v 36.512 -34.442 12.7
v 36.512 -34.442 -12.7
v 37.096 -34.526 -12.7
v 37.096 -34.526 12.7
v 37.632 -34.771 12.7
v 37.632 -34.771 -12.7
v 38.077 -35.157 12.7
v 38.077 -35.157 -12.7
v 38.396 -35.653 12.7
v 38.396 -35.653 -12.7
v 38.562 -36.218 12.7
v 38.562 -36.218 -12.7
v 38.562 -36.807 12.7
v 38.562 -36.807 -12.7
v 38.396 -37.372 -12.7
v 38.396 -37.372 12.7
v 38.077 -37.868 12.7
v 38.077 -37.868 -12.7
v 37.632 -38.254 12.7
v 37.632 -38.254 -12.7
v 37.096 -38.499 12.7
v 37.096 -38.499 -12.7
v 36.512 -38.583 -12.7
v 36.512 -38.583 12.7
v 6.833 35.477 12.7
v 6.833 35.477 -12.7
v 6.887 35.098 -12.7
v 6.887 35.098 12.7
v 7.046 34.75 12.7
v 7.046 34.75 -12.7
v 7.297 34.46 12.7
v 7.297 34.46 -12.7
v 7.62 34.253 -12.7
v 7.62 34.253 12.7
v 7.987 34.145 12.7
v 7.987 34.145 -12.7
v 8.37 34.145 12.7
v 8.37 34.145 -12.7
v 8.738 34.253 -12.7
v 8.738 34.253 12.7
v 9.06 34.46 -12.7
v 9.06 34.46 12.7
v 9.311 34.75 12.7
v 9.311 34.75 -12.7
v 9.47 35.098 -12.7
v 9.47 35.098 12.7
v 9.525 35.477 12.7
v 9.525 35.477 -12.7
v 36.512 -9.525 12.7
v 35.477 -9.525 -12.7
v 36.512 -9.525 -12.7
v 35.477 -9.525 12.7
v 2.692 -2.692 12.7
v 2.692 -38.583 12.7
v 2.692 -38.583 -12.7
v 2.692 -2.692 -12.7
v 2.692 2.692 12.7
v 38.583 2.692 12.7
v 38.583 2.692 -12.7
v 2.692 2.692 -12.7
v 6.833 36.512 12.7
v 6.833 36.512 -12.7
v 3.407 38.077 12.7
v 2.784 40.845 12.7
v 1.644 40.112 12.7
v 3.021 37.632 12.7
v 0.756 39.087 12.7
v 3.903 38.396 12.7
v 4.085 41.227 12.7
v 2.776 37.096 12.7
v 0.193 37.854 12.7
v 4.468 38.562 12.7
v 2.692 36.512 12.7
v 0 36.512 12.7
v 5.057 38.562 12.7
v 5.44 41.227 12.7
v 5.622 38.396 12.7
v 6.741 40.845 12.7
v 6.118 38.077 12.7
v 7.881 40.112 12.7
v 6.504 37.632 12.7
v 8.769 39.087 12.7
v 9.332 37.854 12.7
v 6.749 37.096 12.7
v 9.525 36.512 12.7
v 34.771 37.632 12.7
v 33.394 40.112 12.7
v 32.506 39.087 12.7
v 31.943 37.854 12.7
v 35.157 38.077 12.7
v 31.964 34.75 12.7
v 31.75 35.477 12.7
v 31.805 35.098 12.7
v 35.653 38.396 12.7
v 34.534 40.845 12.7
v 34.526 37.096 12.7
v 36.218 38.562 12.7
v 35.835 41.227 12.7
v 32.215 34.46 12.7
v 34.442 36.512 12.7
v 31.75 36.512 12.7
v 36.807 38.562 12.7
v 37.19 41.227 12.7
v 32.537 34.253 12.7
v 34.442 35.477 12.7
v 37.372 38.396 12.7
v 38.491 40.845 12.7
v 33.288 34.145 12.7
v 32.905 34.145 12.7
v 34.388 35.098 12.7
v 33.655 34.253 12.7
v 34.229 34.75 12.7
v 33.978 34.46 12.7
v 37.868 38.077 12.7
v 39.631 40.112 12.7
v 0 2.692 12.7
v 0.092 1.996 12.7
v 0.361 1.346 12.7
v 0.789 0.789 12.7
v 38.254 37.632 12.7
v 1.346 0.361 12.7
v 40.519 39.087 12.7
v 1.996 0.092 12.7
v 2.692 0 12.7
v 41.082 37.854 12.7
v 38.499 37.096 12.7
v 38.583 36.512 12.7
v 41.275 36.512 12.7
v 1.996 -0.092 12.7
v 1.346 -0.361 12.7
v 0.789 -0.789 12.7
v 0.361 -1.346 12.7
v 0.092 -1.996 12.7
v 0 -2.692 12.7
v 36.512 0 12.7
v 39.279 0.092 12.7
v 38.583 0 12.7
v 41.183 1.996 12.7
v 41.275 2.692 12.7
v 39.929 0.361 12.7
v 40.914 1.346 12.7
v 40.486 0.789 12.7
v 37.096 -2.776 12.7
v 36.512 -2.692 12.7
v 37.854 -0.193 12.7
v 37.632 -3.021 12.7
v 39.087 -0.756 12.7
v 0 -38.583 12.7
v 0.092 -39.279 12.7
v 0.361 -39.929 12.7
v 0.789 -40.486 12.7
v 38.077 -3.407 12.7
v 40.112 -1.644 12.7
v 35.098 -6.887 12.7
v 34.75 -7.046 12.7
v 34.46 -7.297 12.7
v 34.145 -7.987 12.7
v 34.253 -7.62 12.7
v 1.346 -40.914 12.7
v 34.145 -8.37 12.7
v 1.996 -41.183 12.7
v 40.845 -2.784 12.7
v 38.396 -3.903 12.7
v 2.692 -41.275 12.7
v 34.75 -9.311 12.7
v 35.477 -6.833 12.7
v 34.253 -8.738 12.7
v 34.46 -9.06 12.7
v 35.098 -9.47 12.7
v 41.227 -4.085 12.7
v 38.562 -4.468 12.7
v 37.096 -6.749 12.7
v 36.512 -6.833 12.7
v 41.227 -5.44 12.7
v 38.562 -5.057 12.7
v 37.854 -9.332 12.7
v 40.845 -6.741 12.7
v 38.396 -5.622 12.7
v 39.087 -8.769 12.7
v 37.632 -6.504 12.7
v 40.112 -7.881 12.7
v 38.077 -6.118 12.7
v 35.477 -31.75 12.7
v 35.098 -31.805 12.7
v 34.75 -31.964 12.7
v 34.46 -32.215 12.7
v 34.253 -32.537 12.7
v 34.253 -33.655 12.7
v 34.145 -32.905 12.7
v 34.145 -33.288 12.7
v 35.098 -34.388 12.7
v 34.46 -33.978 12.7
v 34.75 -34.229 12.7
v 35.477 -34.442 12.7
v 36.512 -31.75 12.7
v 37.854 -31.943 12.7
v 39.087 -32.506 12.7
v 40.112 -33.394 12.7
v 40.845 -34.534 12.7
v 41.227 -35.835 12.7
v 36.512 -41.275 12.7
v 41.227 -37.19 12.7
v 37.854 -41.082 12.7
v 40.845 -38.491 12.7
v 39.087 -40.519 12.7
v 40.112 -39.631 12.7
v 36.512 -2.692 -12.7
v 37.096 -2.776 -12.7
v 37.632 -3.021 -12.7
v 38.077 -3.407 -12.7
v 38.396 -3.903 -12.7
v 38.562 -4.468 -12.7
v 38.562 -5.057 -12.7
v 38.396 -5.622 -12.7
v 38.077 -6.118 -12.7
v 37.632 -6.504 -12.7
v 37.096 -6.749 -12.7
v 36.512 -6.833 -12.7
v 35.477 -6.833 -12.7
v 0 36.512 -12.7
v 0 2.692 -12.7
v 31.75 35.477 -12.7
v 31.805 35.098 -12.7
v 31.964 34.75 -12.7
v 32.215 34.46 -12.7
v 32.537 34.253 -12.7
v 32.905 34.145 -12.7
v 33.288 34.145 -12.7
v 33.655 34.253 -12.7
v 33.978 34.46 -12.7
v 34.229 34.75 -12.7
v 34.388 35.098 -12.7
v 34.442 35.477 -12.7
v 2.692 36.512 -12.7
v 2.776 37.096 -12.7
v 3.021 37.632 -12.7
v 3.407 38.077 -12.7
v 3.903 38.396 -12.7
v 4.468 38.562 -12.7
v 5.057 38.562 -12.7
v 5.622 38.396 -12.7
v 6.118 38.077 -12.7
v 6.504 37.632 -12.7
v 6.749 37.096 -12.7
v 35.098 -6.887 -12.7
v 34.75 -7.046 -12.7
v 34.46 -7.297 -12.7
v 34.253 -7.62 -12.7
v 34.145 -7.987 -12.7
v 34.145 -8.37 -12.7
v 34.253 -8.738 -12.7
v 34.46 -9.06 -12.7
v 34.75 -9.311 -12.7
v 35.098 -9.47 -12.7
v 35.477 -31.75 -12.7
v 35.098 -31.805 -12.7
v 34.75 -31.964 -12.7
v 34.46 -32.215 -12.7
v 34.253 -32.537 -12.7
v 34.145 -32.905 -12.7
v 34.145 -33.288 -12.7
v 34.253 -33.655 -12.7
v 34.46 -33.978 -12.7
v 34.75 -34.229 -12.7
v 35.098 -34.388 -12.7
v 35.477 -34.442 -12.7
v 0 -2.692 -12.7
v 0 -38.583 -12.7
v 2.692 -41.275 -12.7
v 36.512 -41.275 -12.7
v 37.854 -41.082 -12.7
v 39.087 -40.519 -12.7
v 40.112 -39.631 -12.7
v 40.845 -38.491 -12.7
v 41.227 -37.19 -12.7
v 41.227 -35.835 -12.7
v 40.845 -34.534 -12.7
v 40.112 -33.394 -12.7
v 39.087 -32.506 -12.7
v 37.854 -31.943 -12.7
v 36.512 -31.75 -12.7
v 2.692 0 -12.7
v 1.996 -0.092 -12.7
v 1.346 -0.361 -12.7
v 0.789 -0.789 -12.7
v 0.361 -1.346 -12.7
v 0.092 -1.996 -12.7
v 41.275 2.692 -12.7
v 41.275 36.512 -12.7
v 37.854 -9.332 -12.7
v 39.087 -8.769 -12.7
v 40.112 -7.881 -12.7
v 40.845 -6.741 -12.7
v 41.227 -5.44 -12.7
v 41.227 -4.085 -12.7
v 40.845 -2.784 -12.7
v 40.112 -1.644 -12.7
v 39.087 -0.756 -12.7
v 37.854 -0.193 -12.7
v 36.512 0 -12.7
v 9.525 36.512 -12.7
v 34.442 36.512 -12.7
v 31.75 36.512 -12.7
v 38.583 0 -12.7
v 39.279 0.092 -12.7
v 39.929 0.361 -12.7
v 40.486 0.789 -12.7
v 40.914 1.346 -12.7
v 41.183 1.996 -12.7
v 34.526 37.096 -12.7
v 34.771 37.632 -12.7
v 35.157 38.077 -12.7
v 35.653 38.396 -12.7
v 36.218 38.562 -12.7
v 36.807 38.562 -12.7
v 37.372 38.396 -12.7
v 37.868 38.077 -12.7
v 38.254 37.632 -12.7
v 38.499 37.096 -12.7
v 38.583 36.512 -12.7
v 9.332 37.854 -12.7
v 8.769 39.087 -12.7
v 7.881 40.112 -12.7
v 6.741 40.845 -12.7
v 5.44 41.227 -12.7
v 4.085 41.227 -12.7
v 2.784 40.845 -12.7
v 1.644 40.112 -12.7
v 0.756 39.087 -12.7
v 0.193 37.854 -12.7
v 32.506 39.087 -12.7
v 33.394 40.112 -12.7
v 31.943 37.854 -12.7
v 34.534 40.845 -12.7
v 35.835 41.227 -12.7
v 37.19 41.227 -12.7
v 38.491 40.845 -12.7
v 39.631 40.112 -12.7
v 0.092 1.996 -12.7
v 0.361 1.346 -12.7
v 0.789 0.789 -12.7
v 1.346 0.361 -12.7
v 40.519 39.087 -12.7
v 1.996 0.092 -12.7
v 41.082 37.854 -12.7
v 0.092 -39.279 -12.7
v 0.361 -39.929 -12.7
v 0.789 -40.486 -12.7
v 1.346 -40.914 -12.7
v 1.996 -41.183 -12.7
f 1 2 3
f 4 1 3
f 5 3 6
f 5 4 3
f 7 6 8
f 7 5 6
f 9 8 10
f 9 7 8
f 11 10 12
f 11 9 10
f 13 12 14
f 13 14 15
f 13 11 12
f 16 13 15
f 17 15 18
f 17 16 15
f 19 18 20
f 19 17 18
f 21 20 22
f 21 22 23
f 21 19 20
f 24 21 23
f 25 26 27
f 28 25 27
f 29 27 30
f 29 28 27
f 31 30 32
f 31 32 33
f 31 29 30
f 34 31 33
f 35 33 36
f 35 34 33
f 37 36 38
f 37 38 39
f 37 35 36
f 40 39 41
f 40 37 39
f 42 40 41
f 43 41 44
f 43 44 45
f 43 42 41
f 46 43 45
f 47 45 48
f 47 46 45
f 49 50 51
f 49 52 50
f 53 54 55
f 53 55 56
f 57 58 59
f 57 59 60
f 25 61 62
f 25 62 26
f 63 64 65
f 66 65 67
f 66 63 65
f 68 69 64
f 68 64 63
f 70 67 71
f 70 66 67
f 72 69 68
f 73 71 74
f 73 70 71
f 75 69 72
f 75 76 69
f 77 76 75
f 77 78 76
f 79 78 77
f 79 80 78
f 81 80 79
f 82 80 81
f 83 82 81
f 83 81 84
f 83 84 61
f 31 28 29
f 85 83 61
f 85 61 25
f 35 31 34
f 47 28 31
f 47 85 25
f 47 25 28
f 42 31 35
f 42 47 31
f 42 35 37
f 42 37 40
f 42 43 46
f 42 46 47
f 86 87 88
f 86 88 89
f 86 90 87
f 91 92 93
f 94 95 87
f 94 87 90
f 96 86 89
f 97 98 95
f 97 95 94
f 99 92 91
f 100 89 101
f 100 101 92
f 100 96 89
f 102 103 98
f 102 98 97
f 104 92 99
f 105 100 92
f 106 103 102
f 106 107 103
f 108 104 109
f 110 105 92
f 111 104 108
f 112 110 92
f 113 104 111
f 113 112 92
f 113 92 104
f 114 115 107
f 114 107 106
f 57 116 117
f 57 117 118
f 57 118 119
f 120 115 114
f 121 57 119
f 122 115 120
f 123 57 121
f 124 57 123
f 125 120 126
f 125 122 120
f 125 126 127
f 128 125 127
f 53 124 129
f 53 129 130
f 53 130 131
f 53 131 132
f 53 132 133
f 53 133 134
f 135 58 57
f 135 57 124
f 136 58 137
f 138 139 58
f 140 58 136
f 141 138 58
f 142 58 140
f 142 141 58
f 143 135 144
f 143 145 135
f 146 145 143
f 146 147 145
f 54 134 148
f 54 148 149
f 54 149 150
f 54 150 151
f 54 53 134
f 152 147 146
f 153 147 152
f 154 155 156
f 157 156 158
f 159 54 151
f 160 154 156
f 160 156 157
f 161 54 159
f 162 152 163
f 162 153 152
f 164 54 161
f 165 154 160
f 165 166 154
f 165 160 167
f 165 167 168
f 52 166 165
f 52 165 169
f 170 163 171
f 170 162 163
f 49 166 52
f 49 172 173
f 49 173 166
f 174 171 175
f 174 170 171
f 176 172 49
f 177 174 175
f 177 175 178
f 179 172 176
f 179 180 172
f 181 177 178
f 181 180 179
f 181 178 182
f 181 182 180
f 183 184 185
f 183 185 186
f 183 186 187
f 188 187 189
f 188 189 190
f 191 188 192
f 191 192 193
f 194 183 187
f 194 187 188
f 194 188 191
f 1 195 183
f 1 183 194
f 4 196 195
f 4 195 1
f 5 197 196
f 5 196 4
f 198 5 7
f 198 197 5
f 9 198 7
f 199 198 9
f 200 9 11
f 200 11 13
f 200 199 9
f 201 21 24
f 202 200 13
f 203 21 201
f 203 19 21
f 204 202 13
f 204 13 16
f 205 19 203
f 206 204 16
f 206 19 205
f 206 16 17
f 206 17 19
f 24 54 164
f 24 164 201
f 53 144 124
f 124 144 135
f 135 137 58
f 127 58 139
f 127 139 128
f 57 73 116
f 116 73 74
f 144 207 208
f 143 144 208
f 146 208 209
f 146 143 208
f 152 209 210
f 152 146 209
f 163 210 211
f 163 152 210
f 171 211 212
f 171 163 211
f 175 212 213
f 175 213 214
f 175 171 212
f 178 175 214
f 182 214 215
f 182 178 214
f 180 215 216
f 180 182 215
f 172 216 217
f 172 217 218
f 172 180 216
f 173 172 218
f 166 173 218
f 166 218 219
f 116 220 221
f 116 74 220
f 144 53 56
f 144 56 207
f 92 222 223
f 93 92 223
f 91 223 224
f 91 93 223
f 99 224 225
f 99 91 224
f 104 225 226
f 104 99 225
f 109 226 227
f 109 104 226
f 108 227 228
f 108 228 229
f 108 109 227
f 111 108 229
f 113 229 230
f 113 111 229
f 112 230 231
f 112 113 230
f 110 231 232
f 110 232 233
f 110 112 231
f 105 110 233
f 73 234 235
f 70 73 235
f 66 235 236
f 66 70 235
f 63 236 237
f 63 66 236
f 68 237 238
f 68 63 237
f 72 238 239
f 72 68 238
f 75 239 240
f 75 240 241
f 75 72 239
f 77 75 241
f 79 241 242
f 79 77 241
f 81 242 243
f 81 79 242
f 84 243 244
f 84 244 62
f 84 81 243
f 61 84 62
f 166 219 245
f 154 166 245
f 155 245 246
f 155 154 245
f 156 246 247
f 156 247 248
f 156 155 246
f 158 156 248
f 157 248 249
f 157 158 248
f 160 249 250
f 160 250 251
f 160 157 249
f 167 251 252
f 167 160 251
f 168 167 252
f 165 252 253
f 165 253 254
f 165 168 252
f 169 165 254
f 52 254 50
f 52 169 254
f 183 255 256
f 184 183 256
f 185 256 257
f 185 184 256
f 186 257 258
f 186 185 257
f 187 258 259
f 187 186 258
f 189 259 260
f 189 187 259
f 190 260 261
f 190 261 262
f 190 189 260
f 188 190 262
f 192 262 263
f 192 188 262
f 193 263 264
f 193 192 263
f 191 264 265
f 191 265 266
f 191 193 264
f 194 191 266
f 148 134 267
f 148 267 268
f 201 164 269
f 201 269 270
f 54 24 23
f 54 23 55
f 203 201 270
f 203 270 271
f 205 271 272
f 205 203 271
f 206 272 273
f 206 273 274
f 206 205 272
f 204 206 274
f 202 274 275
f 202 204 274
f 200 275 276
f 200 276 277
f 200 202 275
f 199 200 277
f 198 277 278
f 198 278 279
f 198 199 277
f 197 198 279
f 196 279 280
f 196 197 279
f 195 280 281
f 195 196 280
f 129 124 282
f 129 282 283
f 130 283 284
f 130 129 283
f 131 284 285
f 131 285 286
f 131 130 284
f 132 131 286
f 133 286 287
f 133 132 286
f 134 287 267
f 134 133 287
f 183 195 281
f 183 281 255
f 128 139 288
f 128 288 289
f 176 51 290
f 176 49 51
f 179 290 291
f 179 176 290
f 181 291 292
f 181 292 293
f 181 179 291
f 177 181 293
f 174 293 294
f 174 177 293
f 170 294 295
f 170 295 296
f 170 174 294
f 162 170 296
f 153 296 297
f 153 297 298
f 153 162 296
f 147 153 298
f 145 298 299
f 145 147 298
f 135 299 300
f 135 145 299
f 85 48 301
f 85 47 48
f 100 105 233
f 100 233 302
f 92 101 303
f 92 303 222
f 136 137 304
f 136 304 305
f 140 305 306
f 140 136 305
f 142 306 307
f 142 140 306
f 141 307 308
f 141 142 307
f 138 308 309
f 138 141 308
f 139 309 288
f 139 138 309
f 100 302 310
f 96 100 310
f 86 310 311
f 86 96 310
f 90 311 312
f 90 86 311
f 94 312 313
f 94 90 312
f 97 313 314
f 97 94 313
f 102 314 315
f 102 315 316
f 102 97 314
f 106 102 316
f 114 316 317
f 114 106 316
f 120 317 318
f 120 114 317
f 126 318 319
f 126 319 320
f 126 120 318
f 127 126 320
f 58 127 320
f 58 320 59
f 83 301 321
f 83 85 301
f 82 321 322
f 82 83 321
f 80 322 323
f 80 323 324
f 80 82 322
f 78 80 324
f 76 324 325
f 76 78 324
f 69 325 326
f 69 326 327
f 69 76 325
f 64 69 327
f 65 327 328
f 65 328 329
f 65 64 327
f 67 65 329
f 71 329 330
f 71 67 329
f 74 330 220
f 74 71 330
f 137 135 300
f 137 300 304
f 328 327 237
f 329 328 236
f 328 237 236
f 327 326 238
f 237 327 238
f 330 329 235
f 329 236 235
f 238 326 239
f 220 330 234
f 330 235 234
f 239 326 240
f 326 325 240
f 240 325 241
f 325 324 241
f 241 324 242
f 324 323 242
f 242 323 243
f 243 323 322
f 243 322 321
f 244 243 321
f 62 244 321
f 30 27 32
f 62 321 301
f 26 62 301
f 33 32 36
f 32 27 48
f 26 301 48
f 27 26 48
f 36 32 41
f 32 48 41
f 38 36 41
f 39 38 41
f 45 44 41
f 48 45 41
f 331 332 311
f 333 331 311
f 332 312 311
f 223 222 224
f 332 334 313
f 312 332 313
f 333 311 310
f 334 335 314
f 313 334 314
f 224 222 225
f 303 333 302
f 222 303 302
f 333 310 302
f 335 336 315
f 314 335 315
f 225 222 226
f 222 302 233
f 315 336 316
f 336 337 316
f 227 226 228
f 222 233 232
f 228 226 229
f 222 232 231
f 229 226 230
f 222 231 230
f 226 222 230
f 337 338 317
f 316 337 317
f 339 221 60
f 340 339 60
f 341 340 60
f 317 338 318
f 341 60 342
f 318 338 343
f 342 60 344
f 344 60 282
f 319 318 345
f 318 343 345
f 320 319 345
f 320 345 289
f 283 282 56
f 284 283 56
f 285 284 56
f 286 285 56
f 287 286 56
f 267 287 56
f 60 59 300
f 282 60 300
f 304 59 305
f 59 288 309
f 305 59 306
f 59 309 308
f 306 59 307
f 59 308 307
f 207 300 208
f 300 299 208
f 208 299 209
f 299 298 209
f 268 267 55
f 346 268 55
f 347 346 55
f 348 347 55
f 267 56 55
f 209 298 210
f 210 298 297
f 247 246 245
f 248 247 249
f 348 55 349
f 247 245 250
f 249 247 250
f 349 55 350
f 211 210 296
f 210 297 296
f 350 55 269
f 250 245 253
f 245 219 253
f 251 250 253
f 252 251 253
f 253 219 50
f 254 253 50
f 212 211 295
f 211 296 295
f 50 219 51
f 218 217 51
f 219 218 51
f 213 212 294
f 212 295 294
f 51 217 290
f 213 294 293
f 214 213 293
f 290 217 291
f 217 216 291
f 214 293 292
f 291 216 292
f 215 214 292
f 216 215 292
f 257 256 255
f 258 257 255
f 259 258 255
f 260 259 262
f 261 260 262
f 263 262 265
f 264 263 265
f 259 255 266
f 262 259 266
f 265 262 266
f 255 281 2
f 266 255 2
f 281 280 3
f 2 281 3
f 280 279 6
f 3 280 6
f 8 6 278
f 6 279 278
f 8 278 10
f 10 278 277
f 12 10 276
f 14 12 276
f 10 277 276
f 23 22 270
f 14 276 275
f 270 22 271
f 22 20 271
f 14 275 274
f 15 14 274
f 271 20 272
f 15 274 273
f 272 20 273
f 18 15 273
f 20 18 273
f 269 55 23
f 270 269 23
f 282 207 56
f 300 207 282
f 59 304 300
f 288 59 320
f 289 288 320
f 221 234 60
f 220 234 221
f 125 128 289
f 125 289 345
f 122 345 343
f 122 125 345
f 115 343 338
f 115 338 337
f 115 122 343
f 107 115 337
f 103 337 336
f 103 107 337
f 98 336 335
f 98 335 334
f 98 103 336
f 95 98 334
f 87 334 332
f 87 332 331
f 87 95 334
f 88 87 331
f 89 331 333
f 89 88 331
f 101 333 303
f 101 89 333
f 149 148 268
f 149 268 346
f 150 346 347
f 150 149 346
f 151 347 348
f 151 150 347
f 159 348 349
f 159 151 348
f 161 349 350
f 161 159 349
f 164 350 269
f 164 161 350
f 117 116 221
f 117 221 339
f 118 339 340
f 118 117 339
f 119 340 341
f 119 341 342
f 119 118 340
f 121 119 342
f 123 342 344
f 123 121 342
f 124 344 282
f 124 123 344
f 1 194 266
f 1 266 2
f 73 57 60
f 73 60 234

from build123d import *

# Parameters (mm, degrees)
BASE_EXTRUDE_DEPTH = 12.7
CIRPATTERN1_COUNT  = 2
CIRPATTERN1_ANGLE  = 270


with BuildPart() as part:
    # Sketch1 → Base-Extrude (new, symmetric)
    with BuildSketch(Plane.XY):
        with BuildLine():
            Line((0, 36.5125), (0, 2.6924))
            ThreePointArc((0, 2.6924), (0.788585702, 0.788585702), (2.6924, 0))
            Line((2.6924, 0), (38.5826, 0))
            ThreePointArc((38.5826, 0), (40.486414298, 0.788585702), (41.275, 2.6924))
            Line((41.275, 2.6924), (41.275, 36.5125))
            ThreePointArc((41.275, 36.5125), (36.5125, 41.275), (31.75, 36.5125))
            Line((31.75, 36.5125), (31.75, 35.47745))
            ThreePointArc((31.75, 35.47745), (33.0962, 34.13125), (34.4424, 35.47745))
            Line((34.4424, 35.47745), (34.4424, 36.5125))
            ThreePointArc((34.4424, 36.5125), (36.5125, 38.5826), (38.5826, 36.5125))
            Line((38.5826, 36.5125), (38.5826, 2.6924))
            Line((38.5826, 2.6924), (2.6924, 2.6924))
            Line((2.6924, 2.6924), (2.6924, 36.5125))
            ThreePointArc((2.6924, 36.5125), (4.7625, 38.5826), (6.8326, 36.5125))
            Line((6.8326, 36.5125), (6.8326, 35.47745))
            ThreePointArc((6.8326, 35.47745), (8.1788, 34.13125), (9.525, 35.47745))
            Line((9.525, 35.47745), (9.525, 36.5125))
            ThreePointArc((9.525, 36.5125), (4.7625, 41.275), (0, 36.5125))
        make_face()
    base_extrude = extrude(amount=BASE_EXTRUDE_DEPTH, both=True)

    # CirPattern1: Base-Extrude ×2 about axis
    cirpattern1_axis = Axis((0, 0, 0), (0, 0, 1))
    for i in range(1, CIRPATTERN1_COUNT):
        add(base_extrude.rotate(cirpattern1_axis, i * CIRPATTERN1_ANGLE / (CIRPATTERN1_COUNT - 1)))


solid = part.part
